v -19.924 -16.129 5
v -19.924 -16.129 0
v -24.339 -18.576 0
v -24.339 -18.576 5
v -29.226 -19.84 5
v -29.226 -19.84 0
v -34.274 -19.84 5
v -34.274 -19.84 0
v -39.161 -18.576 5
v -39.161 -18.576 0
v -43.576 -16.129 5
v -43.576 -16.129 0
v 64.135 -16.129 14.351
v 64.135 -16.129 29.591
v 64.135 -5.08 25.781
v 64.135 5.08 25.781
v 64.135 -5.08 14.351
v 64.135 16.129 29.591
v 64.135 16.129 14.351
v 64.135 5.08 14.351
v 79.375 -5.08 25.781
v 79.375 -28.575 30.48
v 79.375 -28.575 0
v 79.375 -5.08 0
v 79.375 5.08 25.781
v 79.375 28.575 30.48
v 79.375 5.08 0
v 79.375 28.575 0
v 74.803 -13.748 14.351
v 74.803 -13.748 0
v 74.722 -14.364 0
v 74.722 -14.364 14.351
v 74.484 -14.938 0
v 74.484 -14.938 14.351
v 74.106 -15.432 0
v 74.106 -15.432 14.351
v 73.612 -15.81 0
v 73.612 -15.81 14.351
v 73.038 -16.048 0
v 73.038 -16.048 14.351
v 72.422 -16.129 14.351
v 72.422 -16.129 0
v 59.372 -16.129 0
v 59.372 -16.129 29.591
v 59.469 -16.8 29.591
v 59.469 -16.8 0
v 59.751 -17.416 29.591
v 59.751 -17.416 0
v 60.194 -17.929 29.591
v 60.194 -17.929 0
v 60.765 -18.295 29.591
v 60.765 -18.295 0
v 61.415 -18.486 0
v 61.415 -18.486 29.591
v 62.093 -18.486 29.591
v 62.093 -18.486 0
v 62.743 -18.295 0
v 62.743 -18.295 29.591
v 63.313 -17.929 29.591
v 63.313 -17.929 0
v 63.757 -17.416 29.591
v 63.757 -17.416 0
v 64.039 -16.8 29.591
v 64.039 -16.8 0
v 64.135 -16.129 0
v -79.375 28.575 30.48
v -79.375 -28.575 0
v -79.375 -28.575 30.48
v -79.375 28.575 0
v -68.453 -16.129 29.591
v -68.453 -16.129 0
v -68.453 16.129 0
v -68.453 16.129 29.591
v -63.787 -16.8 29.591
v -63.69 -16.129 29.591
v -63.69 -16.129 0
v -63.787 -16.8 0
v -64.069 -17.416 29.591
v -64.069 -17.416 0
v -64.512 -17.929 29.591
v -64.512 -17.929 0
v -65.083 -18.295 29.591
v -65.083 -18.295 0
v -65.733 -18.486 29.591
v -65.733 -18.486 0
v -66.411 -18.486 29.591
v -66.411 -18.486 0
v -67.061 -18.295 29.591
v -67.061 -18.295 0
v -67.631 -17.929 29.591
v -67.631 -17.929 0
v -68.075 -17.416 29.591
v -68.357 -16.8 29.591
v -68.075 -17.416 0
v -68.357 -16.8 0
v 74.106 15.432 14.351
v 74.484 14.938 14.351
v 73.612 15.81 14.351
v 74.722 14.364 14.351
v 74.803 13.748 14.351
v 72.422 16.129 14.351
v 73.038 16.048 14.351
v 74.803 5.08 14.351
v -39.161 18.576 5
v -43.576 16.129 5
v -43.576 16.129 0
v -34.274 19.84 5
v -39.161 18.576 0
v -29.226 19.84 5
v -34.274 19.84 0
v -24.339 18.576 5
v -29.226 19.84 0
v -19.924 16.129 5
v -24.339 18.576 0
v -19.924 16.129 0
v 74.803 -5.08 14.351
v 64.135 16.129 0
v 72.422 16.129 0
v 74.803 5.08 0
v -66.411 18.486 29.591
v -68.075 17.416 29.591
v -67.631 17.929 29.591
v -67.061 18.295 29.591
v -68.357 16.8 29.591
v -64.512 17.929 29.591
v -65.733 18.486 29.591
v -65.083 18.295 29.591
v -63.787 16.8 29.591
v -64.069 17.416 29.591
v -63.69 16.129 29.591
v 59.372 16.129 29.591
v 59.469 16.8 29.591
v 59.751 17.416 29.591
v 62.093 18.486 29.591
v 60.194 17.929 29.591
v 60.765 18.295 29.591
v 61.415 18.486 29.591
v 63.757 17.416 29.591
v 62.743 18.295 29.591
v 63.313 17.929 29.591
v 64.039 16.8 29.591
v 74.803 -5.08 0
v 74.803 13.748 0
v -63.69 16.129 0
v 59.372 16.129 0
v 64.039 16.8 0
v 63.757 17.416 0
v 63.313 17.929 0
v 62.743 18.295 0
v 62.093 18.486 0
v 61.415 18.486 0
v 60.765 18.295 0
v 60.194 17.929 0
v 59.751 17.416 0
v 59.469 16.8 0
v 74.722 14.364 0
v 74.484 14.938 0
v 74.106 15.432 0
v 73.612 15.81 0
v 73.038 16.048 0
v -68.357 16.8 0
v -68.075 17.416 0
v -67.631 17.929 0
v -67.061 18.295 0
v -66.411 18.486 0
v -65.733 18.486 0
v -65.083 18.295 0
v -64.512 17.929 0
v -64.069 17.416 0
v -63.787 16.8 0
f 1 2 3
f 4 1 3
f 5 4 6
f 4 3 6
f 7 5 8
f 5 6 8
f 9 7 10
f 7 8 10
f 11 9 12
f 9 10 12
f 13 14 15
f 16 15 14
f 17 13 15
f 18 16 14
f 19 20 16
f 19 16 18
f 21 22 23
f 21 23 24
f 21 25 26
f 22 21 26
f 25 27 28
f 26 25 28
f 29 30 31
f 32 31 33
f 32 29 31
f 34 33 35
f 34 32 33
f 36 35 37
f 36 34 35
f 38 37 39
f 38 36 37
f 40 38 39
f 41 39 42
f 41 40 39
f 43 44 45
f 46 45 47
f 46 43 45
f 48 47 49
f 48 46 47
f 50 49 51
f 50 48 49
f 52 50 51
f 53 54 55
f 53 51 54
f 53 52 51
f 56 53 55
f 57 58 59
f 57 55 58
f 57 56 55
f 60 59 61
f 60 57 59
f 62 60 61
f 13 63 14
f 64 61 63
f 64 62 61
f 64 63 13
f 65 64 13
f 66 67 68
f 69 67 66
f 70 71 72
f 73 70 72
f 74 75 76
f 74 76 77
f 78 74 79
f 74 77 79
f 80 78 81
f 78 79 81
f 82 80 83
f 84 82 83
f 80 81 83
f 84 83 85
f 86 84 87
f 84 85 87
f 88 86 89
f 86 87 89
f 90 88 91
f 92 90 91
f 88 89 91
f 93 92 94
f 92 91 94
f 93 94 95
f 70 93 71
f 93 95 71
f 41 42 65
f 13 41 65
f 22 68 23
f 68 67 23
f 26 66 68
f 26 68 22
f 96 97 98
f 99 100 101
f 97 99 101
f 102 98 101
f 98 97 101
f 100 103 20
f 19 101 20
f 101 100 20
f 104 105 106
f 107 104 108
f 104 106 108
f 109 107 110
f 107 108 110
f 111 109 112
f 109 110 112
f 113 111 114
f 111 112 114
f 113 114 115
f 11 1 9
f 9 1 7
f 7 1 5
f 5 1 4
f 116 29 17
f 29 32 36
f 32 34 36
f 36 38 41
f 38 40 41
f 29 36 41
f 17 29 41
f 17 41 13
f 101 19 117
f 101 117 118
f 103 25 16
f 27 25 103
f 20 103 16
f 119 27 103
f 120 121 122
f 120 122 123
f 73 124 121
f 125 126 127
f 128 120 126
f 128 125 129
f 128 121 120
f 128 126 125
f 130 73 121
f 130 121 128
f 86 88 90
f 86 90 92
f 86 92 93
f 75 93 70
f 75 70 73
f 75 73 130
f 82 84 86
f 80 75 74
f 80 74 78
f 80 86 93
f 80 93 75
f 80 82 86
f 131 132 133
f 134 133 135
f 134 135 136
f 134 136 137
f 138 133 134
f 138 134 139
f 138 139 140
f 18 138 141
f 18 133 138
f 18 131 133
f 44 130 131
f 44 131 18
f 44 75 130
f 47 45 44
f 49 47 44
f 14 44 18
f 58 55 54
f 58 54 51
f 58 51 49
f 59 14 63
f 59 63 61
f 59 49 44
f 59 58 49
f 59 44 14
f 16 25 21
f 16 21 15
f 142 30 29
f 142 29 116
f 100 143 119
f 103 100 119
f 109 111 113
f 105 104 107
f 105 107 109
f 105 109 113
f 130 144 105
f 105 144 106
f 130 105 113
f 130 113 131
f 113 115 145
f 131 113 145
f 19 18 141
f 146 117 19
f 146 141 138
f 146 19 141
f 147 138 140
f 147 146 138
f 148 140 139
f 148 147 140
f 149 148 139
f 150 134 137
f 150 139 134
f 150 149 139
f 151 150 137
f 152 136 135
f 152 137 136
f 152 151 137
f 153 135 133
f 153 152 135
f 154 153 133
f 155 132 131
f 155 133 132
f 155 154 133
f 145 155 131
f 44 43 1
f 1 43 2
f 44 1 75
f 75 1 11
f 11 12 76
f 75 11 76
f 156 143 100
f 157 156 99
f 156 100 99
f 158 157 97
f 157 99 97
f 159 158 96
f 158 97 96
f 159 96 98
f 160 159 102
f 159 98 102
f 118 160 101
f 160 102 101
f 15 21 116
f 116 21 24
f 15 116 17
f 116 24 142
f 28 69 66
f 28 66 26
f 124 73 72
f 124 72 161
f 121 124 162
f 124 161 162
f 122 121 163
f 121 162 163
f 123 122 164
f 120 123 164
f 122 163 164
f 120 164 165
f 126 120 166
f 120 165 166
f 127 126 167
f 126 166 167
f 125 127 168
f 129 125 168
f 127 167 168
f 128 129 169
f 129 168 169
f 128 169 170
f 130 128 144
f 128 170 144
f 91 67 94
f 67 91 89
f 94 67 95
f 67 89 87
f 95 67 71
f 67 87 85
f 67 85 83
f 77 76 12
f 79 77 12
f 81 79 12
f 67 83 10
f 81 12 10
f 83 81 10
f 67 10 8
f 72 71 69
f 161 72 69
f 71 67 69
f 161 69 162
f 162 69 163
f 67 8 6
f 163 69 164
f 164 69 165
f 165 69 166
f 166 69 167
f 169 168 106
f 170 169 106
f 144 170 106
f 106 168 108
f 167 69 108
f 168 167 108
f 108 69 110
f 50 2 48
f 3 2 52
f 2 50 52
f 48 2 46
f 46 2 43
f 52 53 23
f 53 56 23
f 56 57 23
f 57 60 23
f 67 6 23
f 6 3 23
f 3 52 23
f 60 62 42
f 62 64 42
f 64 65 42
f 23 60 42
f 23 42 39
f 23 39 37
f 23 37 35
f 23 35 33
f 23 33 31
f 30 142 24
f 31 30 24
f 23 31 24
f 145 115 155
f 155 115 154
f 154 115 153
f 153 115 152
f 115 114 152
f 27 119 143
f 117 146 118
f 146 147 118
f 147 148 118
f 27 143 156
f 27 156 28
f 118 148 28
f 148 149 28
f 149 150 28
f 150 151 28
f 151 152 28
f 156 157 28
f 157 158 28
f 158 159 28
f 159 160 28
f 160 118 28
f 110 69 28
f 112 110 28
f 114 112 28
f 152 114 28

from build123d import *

# Parameters (mm, degrees)
SKETCH1_W           = 158.75
SKETCH1_H           = 57.15
BOSS_EXTRUDE1_DEPTH = 29.591
SKETCH2_W           = 132.588
SKETCH2_H           = 32.258
CUT_EXTRUDE1_DEPTH  = 90.401054418
CUT_EXTRUDE2_DEPTH  = 14.351
FILLET1_R           = 2.38125
SKETCH8_W           = 15.24
SKETCH8_H           = 10.16
CUT_EXTRUDE5_DEPTH  = 25.781
SKETCH5_W           = 158.75
SKETCH5_H           = 57.15
BOSS_EXTRUDE2_DEPTH = 0.889
CUT_EXTRUDE3_REACH  = 91.699
SKETCH7_R           = 20
CUT_EXTRUDE4_DEPTH  = 5


with BuildPart() as part:
    # Sketch1 → Boss-Extrude1 (new body)
    with BuildSketch(Plane.XY):
        Rectangle(SKETCH1_W, SKETCH1_H)
    extrude(amount=BOSS_EXTRUDE1_DEPTH)

    # Sketch2 → Cut-Extrude1 (cut, through all)
    with BuildSketch(Plane(origin=(0, 0, 0), x_dir=(-1, 0, 0), z_dir=(0, 0, -1))):
        with Locations((2.159, 0)):
            Rectangle(SKETCH2_W, SKETCH2_H)
    extrude(amount=-CUT_EXTRUDE1_DEPTH, mode=Mode.SUBTRACT)

    # Sketch4 → Cut-Extrude2 (cut)
    with BuildSketch(Plane(origin=(0, 0, 0), x_dir=(-1, 0, 0), z_dir=(0, 0, -1))):
        Polygon((-74.803, 5.08), (-89.535, 5.08), (-89.535, 3.5), (-79.375, 3.5), (-79.375, 0), (-64.135, 0), (-64.135, 5.08), (-64.135, 16.129), (-74.803, 16.129), align=None)
    cut_extrude2 = extrude(amount=-CUT_EXTRUDE2_DEPTH, mode=Mode.SUBTRACT)

    # Mirror1: Cut-Extrude2 across plane
    add(cut_extrude2.mirror(Plane.ZX), mode=Mode.SUBTRACT)

    # Fillet1
    fillet1_edges = [part.edges().sort_by_distance(p)[0] for p in [
        (74.803, 16.129, 7.1755),
        (74.803, -16.129, 7.1755),
    ]]
    fillet(fillet1_edges, radius=FILLET1_R)

    # Sketch8 → Cut-Extrude5 (cut)
    with BuildSketch(Plane(origin=(0, 0, 0), x_dir=(-1, 0, 0), z_dir=(0, 0, -1))):
        with Locations((-71.755, 0)):
            Rectangle(SKETCH8_W, SKETCH8_H)
    extrude(amount=-CUT_EXTRUDE5_DEPTH, mode=Mode.SUBTRACT)

    # Sketch5 → Boss-Extrude2 (add)
    with BuildSketch(Plane.XY.offset(29.591)):
        Rectangle(SKETCH5_W, SKETCH5_H)
    extrude(amount=BOSS_EXTRUDE2_DEPTH)

    # Cut-Extrude3: up to this face of the body (flat: up to its plane)
    cut_extrude3_end = Plane(part.part.faces().sort_by_distance((-2.159, 0, 29.591))[0])
    # Sketch6 → Cut-Extrude3 (cut, up to the picked face)
    with BuildSketch(Plane(origin=(0, 0, 0), x_dir=(-1, 0, 0), z_dir=(0, 0, -1)), mode=Mode.PRIVATE) as cut_extrude3_sk1:
        with BuildLine():
            Line((-64.135, -16.129), (-64.135, 16.129))
            ThreePointArc((-64.135, 16.129), (-61.75375, 18.51025), (-59.3725, 16.129))
            Line((-59.3725, 16.129), (-59.3725, -16.129))
            ThreePointArc((-59.3725, -16.129), (-61.75375, -18.51025), (-64.135, -16.129))
        make_face()
    cut_extrude3_tool1 = split(extrude(cut_extrude3_sk1.sketch, amount=-CUT_EXTRUDE3_REACH, mode=Mode.PRIVATE), bisect_by=cut_extrude3_end, keep=Keep.BOTH, mode=Mode.PRIVATE)
    # Sketch6 → Cut-Extrude3 (cut, up to the picked face)
    with BuildSketch(Plane(origin=(0, 0, 0), x_dir=(-1, 0, 0), z_dir=(0, 0, -1)), mode=Mode.PRIVATE) as cut_extrude3_sk2:
        with BuildLine():
            Line((68.453, -16.129), (68.453, 16.129))
            ThreePointArc((68.453, 16.129), (66.07175, 18.51025), (63.6905, 16.129))
            Line((63.6905, 16.129), (63.6905, -16.129))
            ThreePointArc((63.6905, -16.129), (66.07175, -18.51025), (68.453, -16.129))
        make_face()
    cut_extrude3_tool2 = split(extrude(cut_extrude3_sk2.sketch, amount=-CUT_EXTRUDE3_REACH, mode=Mode.PRIVATE), bisect_by=cut_extrude3_end, keep=Keep.BOTH, mode=Mode.PRIVATE)
    add(cut_extrude3_tool1.solids().sort_by(Axis((61.75375, 0, 0), (0, 0, 1)))[0], mode=Mode.SUBTRACT)
    add(cut_extrude3_tool2.solids().sort_by(Axis((-66.07175, 0, 0), (0, 0, 1)))[0], mode=Mode.SUBTRACT)

    # Sketch7 → Cut-Extrude4 (cut)
    with BuildSketch(Plane(origin=(0, 0, 0), x_dir=(-1, 0, 0), z_dir=(0, 0, -1))):
        with Locations((31.75, 0)):
            Circle(SKETCH7_R)
    extrude(amount=-CUT_EXTRUDE4_DEPTH, mode=Mode.SUBTRACT)


solid = part.part
